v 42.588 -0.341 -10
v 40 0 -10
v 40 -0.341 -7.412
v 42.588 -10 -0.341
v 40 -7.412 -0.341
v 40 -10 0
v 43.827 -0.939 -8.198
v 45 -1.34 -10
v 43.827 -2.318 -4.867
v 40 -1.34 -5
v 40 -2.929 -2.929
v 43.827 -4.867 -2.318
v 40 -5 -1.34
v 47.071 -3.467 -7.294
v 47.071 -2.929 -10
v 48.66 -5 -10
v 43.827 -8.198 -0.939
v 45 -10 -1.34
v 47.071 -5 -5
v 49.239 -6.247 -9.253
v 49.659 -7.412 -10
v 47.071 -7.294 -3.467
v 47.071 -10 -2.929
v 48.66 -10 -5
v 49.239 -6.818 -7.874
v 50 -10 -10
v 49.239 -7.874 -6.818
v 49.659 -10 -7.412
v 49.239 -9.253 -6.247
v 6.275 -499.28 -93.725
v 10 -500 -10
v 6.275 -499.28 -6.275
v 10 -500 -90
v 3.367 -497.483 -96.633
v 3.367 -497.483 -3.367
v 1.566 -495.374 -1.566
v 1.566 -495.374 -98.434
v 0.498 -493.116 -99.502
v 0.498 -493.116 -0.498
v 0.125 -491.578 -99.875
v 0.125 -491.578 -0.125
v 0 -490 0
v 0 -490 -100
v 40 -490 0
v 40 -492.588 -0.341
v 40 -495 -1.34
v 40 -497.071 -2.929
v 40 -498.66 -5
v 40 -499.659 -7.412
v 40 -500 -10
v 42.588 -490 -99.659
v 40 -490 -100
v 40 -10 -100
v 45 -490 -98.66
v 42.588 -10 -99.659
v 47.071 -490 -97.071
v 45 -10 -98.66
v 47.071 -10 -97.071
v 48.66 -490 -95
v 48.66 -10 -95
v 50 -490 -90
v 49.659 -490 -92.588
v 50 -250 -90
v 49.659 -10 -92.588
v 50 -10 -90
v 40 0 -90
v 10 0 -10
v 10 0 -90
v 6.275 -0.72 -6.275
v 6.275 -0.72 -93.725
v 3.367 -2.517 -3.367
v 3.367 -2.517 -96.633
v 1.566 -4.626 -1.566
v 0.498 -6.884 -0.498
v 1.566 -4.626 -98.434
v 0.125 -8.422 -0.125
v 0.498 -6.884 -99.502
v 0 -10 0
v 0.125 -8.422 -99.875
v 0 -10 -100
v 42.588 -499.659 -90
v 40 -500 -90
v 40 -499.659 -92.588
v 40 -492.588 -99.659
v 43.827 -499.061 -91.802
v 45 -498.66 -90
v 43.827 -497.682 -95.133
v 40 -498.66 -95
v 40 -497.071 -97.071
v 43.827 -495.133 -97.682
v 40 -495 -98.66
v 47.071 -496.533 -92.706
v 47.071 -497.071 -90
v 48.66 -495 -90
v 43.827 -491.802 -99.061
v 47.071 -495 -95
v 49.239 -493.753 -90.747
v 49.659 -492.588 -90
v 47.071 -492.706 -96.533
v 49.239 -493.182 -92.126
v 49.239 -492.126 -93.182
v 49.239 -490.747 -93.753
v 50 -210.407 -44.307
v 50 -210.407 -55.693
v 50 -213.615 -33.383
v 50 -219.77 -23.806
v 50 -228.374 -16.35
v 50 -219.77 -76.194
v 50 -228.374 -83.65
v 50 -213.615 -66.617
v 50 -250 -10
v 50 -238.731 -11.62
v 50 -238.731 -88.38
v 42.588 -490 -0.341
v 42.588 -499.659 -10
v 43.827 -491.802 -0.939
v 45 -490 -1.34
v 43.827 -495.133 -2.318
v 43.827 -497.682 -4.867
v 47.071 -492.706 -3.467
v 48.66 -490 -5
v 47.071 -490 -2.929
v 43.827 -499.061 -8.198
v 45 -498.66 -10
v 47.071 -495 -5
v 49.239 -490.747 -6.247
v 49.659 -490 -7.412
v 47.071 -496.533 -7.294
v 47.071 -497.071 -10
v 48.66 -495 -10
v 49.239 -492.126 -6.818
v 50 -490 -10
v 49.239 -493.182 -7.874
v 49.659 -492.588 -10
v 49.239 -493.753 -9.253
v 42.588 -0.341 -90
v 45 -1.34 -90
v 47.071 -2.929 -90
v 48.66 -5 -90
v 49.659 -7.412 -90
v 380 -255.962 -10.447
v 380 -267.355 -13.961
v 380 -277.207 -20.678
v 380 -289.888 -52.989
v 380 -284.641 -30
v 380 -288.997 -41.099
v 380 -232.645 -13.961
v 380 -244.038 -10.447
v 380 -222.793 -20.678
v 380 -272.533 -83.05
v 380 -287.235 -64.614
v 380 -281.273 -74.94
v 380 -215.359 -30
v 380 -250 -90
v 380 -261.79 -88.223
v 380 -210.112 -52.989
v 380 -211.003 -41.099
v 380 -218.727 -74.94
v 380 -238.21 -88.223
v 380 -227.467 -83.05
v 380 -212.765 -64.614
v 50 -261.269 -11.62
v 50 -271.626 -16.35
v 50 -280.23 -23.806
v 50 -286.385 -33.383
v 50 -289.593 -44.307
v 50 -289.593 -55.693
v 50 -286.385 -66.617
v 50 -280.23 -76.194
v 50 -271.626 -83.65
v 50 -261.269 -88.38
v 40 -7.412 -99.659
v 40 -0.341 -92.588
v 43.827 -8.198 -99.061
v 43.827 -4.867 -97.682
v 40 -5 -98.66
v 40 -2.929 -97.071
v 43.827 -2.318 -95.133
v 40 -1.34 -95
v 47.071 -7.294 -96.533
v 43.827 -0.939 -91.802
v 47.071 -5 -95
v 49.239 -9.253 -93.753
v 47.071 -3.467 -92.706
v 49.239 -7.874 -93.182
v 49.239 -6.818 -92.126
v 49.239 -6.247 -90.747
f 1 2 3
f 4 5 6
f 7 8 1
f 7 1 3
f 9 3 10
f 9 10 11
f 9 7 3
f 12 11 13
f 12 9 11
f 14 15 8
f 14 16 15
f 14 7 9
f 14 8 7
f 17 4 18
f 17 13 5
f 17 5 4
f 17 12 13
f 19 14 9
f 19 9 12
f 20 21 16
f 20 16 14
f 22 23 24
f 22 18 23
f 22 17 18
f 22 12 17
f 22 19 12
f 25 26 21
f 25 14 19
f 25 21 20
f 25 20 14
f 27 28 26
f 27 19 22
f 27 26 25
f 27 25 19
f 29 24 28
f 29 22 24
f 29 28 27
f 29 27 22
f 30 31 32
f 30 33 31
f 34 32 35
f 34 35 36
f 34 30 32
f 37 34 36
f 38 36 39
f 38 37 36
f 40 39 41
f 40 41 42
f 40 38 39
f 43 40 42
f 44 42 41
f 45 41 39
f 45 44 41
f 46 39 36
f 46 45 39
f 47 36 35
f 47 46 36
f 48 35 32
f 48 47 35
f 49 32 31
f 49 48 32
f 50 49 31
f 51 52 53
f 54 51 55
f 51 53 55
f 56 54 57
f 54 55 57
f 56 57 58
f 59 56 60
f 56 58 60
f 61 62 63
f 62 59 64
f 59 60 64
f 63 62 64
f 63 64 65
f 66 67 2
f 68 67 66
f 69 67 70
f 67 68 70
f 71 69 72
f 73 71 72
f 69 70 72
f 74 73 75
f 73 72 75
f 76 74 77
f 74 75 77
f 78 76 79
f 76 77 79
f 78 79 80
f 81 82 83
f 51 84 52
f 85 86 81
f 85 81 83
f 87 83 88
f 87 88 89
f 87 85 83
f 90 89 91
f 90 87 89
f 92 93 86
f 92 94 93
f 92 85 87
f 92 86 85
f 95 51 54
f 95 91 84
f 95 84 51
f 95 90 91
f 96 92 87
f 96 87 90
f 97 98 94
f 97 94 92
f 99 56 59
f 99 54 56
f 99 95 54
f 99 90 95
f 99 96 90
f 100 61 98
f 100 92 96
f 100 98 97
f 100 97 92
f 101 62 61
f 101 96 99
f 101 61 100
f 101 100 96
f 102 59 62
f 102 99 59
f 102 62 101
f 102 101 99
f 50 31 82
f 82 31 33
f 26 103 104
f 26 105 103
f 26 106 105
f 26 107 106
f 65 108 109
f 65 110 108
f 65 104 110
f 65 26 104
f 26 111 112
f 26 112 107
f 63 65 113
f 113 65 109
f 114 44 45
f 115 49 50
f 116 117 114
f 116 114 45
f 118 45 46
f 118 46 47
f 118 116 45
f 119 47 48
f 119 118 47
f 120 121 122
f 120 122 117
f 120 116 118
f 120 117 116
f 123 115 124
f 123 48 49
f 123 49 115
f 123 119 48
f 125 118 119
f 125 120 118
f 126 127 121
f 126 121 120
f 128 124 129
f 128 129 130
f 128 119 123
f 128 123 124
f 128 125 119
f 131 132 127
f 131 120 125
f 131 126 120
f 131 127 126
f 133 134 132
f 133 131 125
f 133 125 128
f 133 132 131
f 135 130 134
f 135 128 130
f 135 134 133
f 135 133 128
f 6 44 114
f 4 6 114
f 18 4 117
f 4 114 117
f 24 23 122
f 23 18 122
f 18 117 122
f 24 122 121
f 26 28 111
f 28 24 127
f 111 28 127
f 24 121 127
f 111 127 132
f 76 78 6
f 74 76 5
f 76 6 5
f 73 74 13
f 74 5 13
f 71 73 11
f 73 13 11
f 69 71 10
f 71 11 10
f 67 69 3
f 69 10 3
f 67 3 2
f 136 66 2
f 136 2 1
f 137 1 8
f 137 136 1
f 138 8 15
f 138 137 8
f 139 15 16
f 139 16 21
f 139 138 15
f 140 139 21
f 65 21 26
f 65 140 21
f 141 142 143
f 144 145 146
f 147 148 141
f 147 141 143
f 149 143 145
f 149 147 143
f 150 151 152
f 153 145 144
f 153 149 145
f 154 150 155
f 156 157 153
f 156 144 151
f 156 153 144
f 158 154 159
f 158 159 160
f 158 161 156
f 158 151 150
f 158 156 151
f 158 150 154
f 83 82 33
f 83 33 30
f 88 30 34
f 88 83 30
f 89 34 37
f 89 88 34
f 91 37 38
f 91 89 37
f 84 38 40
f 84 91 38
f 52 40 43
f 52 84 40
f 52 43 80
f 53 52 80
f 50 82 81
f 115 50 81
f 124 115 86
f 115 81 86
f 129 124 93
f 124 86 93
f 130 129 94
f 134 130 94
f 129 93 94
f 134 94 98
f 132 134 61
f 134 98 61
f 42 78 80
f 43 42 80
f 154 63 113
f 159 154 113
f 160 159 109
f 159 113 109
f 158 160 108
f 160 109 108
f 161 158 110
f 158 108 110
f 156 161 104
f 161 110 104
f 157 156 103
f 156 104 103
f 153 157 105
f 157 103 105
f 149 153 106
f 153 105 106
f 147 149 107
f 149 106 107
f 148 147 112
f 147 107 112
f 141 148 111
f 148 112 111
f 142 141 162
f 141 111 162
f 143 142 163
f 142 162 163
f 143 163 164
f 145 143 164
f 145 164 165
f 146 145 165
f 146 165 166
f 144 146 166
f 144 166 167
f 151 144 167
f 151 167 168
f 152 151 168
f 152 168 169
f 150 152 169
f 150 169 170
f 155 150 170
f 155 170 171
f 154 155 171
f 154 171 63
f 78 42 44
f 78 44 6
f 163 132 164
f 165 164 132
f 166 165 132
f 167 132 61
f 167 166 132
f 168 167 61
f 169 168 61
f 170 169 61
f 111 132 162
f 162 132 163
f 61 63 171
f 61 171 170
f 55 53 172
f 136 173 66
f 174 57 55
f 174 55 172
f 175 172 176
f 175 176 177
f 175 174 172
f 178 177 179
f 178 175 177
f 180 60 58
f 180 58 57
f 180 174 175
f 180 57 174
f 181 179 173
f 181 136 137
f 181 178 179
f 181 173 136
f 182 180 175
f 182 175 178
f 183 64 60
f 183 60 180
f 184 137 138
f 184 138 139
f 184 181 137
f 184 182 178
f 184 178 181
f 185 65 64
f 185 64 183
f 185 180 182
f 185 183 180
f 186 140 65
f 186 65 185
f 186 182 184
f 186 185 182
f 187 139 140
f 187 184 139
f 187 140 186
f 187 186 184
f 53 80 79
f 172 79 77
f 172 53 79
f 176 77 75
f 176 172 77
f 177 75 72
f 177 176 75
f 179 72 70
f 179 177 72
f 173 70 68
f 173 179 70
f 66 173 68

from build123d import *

# Parameters (mm, degrees)
SKETCH1_W           = 100
SKETCH1_H           = 500
BOSS_EXTRUDE1_DEPTH = 50
FILLET1_R           = 10
FILLET2_R           = 10
SKETCH2_R           = 40
BOSS_EXTRUDE2_DEPTH = 330


with BuildPart() as part:
    # Sketch1 → Boss-Extrude1 (new body)
    with BuildSketch(Plane(origin=(0, 0, 0), x_dir=(0, 0, -1), z_dir=(1, 0, 0))):
        with Locations((50, -250)):
            Rectangle(SKETCH1_W, SKETCH1_H)
    extrude(amount=BOSS_EXTRUDE1_DEPTH)

    # Fillet1
    fillet1_edges = [part.edges().sort_by_distance(p)[0] for p in [
        (50, 0, -50),
        (0, 0, -50),
        (0, -500, -50),
        (25, 0, 0),
        (25, 0, -100),
        (25, -500, -100),
        (25, -500, 0),
        (50, -500, -50),
    ]]
    fillet(fillet1_edges, radius=FILLET1_R)

    # Fillet2
    # the kernel refuses this fillet: 10 mm, written as the material it takes off along each edge
    with BuildSketch(Plane(origin=(40, -10, -10), x_dir=(0, 0, 1), z_dir=(1, 0, 0))) as fillet2_piece_1_section:
        Polygon((0, 0), (FILLET2_R, 0), (FILLET2_R, -FILLET2_R), (0, -FILLET2_R), align=None)
    fillet2_piece_1 = extrude(amount=FILLET2_R, mode=Mode.PRIVATE)
    fillet2_piece_1 = fillet2_piece_1 - Plane(origin=(40, -10, -10), x_dir=(0, -0.7071067811865475, -0.7071067811865476), z_dir=(1, 0, 0)) * Sphere(FILLET2_R, mode=Mode.PRIVATE)
    add(fillet2_piece_1, mode=Mode.SUBTRACT)
    with BuildSketch(Plane(origin=(40, -10, -90), x_dir=(0, 0, -1), z_dir=(1, 0, 0))) as fillet2_piece_2_section:
        Polygon((0, 0), (FILLET2_R, 0), (FILLET2_R, FILLET2_R), (0, FILLET2_R), align=None)
    fillet2_piece_2 = extrude(amount=FILLET2_R, mode=Mode.PRIVATE)
    fillet2_piece_2 = fillet2_piece_2 - Plane(origin=(40, -10, -90), x_dir=(0, -0.7071067811865477, 0.7071067811865475), z_dir=(1, 0, 0)) * Sphere(FILLET2_R, mode=Mode.PRIVATE)
    add(fillet2_piece_2, mode=Mode.SUBTRACT)
    with BuildSketch(Plane(origin=(40, -490, -10), x_dir=(0, 0, 1), z_dir=(1, 0, 0))) as fillet2_piece_3_section:
        Polygon((0, 0), (FILLET2_R, 0), (FILLET2_R, FILLET2_R), (0, FILLET2_R), align=None)
    fillet2_piece_3 = extrude(amount=FILLET2_R, mode=Mode.PRIVATE)
    fillet2_piece_3 = fillet2_piece_3 - Plane(origin=(40, -490, -10), x_dir=(0, 0.7071067811865477, -0.7071067811865475), z_dir=(1, 0, 0)) * Sphere(FILLET2_R, mode=Mode.PRIVATE)
    add(fillet2_piece_3, mode=Mode.SUBTRACT)
    with BuildSketch(Plane(origin=(40, -490, -90), x_dir=(0, 0, -1), z_dir=(1, 0, 0))) as fillet2_piece_4_section:
        Polygon((0, 0), (FILLET2_R, 0), (FILLET2_R, -FILLET2_R), (0, -FILLET2_R), align=None)
    fillet2_piece_4 = extrude(amount=FILLET2_R, mode=Mode.PRIVATE)
    fillet2_piece_4 = fillet2_piece_4 - Plane(origin=(40, -490, -90), x_dir=(0, 0.7071067811865475, 0.7071067811865476), z_dir=(1, 0, 0)) * Sphere(FILLET2_R, mode=Mode.PRIVATE)
    add(fillet2_piece_4, mode=Mode.SUBTRACT)
    with BuildSketch(Plane(origin=(50, -10, -100), x_dir=(0, 0, 1), z_dir=(0, -1, 0)), Plane(origin=(50, -490, 0), x_dir=(0, 0, -1), z_dir=(0, 1, 0))) as fillet2_piece_5:
        with BuildLine():
            CenterArc((FILLET2_R, FILLET2_R), FILLET2_R, 180, 90)
            Line((0, FILLET2_R), (0, 0))
            Line((0, 0), (FILLET2_R, 0))
        make_face()
    extrude(amount=480, mode=Mode.SUBTRACT)

    # Sketch2 → Boss-Extrude2 (add)
    with BuildSketch(Plane(origin=(50, 0, 0), x_dir=(0, 0, -1), z_dir=(1, 0, 0))):
        with Locations((50, -250)):
            Circle(SKETCH2_R)
    extrude(amount=BOSS_EXTRUDE2_DEPTH)


solid = part.part
